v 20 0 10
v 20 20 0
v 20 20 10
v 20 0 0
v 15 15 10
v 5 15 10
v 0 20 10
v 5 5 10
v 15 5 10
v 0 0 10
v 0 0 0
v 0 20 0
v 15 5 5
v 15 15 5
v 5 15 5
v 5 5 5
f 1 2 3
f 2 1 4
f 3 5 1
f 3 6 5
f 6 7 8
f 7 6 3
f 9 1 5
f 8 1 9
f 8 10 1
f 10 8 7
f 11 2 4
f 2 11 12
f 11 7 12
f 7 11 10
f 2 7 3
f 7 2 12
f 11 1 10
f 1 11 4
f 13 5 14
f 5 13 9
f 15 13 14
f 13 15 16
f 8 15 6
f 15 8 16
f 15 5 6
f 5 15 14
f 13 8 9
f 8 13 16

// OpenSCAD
// The exact-geometry audit's case c10 (docs/audits/exact-geometry-rust.md).
// volume: 3500.0
difference() { cube([20,20,10]); translate([5,5,5]) cube([10,10,5]); }
